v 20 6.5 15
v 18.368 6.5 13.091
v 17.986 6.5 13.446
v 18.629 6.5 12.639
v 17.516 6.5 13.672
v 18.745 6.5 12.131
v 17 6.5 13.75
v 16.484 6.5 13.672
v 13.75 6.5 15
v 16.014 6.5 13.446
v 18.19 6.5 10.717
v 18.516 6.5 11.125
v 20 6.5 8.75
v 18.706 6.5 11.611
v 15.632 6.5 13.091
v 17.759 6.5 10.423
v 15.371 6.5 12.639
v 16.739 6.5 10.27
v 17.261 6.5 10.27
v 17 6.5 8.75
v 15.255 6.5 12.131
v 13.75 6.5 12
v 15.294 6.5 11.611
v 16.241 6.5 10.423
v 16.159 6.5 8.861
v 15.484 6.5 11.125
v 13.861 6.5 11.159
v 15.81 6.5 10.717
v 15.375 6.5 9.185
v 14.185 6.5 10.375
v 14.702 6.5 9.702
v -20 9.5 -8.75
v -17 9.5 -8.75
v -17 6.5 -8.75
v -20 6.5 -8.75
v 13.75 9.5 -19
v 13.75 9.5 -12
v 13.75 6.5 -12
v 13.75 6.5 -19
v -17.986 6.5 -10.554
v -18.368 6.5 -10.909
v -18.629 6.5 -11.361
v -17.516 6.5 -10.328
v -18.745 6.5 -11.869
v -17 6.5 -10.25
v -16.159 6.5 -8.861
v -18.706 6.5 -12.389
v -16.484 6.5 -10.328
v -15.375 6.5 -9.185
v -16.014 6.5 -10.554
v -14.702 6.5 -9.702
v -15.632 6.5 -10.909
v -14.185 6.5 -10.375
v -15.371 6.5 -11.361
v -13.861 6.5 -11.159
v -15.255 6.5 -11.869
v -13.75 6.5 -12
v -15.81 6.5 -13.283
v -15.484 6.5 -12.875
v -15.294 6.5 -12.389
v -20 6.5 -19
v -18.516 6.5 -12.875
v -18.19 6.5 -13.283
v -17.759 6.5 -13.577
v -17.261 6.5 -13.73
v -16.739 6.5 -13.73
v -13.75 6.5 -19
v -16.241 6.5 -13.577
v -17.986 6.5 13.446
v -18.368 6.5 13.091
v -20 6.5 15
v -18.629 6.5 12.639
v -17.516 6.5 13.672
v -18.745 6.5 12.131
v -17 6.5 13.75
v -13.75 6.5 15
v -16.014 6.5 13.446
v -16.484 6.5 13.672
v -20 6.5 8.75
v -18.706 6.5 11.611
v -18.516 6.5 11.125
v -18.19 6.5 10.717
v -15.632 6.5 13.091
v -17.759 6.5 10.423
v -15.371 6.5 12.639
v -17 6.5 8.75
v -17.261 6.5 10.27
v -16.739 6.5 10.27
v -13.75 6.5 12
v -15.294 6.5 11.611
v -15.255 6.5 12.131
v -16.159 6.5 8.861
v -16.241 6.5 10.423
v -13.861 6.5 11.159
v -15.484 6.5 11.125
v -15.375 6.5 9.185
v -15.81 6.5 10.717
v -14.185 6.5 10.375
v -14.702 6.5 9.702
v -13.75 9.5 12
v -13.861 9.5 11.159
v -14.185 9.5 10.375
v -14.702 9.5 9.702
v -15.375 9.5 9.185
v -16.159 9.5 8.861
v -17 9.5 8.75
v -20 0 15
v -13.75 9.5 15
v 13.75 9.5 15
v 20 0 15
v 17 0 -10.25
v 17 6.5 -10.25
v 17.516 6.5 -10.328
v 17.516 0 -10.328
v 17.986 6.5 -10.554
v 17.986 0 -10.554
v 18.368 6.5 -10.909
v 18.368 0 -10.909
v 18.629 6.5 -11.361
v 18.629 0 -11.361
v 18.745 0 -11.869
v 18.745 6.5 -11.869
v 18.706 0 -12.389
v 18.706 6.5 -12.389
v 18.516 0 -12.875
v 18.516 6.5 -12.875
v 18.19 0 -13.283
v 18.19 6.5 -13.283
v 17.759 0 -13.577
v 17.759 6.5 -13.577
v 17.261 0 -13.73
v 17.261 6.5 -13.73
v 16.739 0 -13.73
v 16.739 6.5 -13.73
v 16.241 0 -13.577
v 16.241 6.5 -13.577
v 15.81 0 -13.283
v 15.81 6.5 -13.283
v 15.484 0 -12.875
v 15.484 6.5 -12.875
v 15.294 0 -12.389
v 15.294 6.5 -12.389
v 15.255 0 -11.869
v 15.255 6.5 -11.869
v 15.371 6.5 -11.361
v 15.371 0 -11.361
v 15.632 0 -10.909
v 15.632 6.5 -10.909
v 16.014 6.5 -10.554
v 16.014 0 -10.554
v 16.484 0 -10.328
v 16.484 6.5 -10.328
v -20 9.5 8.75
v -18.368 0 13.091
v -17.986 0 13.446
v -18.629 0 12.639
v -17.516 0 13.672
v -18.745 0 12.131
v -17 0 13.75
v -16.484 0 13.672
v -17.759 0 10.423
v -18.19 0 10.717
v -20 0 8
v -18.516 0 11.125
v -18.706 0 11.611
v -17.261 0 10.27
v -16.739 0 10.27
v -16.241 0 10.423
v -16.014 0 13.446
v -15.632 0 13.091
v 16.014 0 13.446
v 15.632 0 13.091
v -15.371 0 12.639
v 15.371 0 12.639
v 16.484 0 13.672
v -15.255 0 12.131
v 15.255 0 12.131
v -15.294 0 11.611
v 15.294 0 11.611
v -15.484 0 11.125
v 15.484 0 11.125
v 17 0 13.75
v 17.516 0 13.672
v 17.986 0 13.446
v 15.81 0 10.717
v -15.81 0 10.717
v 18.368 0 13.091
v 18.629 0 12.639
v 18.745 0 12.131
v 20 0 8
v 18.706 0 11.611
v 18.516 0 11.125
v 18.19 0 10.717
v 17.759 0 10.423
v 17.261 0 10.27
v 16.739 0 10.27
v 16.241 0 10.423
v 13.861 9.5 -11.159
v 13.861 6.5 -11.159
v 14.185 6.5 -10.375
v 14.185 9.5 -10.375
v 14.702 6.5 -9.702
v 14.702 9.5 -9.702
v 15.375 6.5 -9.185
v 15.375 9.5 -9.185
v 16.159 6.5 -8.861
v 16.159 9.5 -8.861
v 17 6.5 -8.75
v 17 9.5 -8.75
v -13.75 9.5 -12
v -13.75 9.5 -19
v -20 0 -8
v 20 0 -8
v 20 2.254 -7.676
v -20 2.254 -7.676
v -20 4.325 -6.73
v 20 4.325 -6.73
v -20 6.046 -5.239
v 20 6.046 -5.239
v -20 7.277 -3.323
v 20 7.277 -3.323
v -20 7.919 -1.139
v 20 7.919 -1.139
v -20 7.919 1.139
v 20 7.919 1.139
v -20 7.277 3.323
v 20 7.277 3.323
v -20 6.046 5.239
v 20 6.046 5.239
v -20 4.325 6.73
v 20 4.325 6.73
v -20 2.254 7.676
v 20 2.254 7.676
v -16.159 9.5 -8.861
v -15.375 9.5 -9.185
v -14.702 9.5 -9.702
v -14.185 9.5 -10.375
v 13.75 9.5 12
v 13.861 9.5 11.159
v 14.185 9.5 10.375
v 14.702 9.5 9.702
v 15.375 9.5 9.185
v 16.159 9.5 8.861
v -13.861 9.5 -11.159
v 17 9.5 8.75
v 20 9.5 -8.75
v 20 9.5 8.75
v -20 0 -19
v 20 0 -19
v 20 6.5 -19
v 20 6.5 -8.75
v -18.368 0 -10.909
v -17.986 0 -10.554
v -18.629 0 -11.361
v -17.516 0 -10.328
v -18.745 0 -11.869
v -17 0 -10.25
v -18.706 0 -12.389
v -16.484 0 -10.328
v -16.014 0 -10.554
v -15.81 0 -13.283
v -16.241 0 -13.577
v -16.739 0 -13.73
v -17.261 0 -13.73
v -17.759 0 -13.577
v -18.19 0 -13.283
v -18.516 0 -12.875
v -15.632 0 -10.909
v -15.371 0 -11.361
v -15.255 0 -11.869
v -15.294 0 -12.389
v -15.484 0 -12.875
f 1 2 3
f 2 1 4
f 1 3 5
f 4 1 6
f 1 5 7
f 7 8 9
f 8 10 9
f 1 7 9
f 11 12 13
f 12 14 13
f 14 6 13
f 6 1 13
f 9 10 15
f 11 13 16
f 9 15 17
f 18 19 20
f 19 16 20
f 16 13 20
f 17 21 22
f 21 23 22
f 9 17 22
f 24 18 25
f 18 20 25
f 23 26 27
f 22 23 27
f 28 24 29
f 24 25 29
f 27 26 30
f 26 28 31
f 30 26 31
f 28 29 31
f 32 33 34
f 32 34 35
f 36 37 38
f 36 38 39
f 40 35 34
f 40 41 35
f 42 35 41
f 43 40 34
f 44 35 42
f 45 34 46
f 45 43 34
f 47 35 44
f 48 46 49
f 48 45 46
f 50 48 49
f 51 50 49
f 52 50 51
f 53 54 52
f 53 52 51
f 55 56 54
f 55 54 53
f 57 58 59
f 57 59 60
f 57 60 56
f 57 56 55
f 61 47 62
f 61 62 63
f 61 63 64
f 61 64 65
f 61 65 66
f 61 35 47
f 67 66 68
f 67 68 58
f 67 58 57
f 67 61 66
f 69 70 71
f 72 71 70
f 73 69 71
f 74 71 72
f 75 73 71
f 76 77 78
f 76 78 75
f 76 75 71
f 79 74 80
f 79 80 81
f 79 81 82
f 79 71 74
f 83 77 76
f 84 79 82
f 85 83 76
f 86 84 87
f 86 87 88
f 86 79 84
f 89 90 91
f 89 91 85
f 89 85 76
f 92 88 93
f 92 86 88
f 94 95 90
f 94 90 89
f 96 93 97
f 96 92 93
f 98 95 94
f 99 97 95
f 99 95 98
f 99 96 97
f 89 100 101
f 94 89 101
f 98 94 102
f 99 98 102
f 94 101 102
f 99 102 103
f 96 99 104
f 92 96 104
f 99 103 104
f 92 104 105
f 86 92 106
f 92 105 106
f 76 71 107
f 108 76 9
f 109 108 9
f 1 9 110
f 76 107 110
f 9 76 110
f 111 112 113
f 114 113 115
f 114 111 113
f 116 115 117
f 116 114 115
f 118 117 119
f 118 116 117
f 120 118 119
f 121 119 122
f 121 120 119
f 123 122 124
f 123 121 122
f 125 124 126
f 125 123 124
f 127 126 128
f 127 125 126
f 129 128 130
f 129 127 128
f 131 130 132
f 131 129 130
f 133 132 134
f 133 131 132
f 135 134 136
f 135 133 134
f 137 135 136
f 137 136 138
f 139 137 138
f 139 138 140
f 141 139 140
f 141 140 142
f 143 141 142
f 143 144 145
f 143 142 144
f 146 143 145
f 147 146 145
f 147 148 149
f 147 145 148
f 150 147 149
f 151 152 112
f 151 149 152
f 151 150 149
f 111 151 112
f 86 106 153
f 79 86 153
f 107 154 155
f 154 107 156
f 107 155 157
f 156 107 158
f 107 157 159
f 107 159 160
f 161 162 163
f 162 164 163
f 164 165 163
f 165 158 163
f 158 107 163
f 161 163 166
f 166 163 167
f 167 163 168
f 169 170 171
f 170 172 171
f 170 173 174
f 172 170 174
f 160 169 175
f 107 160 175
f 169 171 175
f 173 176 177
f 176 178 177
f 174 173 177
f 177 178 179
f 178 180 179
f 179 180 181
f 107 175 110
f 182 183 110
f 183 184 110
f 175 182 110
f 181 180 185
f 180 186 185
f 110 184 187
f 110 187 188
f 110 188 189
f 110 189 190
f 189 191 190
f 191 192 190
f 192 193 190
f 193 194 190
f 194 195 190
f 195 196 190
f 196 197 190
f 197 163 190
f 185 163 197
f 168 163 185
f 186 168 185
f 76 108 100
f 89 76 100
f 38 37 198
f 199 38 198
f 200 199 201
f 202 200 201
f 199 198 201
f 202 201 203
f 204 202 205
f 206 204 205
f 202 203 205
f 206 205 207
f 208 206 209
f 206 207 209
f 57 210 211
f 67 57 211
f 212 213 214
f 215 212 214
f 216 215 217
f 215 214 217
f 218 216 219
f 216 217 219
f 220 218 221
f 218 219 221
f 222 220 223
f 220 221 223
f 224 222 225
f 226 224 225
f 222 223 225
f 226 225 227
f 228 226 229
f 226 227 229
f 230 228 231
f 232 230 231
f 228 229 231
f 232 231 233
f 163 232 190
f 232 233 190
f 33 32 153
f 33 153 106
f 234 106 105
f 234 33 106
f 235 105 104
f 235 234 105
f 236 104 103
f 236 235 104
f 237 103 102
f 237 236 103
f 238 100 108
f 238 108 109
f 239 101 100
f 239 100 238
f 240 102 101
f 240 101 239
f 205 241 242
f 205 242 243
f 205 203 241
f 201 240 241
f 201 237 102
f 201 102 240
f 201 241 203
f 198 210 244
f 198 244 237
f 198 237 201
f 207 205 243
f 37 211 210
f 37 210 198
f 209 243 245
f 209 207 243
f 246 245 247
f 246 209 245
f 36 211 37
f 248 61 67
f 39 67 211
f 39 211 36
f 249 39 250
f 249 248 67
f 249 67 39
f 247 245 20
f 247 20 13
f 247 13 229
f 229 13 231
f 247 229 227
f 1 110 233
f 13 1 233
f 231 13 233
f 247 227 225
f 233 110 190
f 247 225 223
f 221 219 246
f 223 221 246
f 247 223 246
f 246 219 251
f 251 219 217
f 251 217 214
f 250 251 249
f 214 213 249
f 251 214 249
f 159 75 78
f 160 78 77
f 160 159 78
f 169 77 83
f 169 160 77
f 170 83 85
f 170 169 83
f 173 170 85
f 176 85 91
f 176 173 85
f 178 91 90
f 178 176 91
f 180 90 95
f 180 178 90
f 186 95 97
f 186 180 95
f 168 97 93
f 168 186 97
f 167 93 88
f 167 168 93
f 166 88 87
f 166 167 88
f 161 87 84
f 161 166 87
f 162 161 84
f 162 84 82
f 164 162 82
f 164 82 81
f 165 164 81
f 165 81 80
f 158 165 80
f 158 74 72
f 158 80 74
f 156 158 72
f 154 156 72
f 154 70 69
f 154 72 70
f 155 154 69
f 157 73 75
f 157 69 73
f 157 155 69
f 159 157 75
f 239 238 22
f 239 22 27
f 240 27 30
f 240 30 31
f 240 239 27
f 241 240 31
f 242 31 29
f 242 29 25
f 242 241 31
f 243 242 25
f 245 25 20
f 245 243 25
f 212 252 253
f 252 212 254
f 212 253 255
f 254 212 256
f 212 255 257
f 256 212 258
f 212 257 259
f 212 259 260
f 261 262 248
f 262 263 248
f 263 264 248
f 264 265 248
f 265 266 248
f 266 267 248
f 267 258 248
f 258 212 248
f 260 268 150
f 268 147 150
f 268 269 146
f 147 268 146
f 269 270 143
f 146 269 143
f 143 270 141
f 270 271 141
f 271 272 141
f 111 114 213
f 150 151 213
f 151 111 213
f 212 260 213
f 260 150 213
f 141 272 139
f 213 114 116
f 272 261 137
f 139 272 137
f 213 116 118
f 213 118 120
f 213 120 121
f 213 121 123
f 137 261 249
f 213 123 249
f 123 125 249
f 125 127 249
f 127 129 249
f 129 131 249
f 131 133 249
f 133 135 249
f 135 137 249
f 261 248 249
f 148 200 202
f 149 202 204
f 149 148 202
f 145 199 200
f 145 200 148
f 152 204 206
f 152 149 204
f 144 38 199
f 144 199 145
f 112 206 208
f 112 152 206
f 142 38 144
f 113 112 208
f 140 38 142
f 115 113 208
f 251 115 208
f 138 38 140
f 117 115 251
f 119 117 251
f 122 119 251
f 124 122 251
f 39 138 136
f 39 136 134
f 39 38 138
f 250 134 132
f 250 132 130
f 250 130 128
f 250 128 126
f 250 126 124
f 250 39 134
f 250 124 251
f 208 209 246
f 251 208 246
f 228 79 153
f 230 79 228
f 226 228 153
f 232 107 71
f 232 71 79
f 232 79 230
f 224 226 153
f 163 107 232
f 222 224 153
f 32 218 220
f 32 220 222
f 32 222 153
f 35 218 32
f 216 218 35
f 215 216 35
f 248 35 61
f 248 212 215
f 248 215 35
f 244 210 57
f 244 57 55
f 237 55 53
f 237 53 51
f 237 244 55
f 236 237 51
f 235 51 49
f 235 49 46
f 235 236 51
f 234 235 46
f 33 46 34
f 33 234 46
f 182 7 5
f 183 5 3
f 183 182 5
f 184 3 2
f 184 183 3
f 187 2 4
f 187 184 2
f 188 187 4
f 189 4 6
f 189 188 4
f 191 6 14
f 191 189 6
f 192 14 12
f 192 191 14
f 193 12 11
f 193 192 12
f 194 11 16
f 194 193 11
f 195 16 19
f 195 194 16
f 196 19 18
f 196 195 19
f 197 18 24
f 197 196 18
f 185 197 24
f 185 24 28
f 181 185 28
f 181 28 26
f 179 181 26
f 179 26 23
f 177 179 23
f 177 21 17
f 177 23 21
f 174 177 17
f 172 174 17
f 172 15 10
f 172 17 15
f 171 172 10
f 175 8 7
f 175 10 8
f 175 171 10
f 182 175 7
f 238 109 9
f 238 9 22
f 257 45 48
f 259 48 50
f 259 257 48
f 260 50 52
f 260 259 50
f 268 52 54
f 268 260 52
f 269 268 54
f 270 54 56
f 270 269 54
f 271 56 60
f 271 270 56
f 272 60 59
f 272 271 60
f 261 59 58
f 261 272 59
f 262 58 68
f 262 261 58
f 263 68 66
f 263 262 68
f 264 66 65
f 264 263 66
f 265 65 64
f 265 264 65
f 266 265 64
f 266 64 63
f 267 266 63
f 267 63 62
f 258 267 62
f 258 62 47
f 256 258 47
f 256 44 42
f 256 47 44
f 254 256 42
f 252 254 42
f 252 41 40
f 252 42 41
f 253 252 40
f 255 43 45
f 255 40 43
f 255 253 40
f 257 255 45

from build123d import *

# Parameters (mm, degrees)
SKETCH1_W            = 40
SKETCH1_H            = 34
SKETCH1_R            = 1.75
BOSS_EXTRUDE1_DEPTH  = 9.5
SKETCH2_R            = 8
CUT_EXTRUDE1_DEPTH   = 46.290727528
CUT_EXTRUDE2_DEPTH   = 3
MIRROR2_COPY_1_DEPTH = 3
SKETCH4_W            = 6.25
SKETCH4_H            = 4
CUT_EXTRUDE3_DEPTH   = 3


with BuildPart() as part:
    # Sketch1 → Boss-Extrude1 (new body)
    with BuildSketch(Plane(origin=(0, 0, 0), x_dir=(1, 0, 0), z_dir=(0, 1, 0))):
        with Locations((0, 2)):
            Rectangle(SKETCH1_W, SKETCH1_H)
        with Locations(Location((-17, 12, 0), (0, 0, 270))):
            Circle(SKETCH1_R, mode=Mode.SUBTRACT)
        with Locations(Location((17, 12, 0), (0, 0, 270))):
            Circle(SKETCH1_R, mode=Mode.SUBTRACT)
        with Locations(Location((17, -12, 0), (0, 0, 270))):
            Circle(SKETCH1_R, mode=Mode.SUBTRACT)
        with Locations(Location((-17, -12, 0), (0, 0, 270))):
            Circle(SKETCH1_R, mode=Mode.SUBTRACT)
    extrude(amount=BOSS_EXTRUDE1_DEPTH)

    # Sketch2 → Cut-Extrude1 (cut, through all)
    with BuildSketch(Plane(origin=(20, 0, 0), x_dir=(0, 0, -1), z_dir=(1, 0, 0))):
        Circle(SKETCH2_R)
    extrude(amount=-CUT_EXTRUDE1_DEPTH, mode=Mode.SUBTRACT)

    # Sketch3 → Cut-Extrude2 (cut)
    with BuildSketch(Plane(origin=(0, 9.5, 0), x_dir=(1, 0, 0), z_dir=(0, 1, 0))):
        with BuildLine():
            Line((-17, -8.75), (-20, -8.75))
            Line((-20, -8.75), (-20, -15))
            Line((-20, -15), (-13.75, -15))
            Line((-13.75, -15), (-13.75, -12))
            ThreePointArc((-13.75, -12), (-14.701902961, -9.701902961), (-17, -8.75))
        make_face()
    cut_extrude2 = extrude(amount=-CUT_EXTRUDE2_DEPTH, mode=Mode.SUBTRACT)

    # Mirror1: Cut-Extrude2 across plane
    add(cut_extrude2.mirror(Plane(origin=(0, 0, 0), x_dir=(0, 0, 1), z_dir=(1, 0, 0))), mode=Mode.SUBTRACT)

    # Mirror2: Cut-Extrude2 across plane
    add(cut_extrude2.mirror(Plane.XY), mode=Mode.SUBTRACT)

    # Mirror2 copy 1 sketch → Mirror2 copy 1 (cut)
    with BuildSketch(Plane(origin=(0, 9.5, 0), x_dir=(-1, 0, 0), z_dir=(0, 1, 0))):
        with BuildLine():
            Line((-17, -8.75), (-20, -8.75))
            Line((-20, -8.75), (-20, -15))
            Line((-20, -15), (-13.75, -15))
            Line((-13.75, -15), (-13.75, -12))
            ThreePointArc((-13.75, -12), (-14.701902961, -9.701902961), (-17, -8.75))
        make_face()
    extrude(amount=-MIRROR2_COPY_1_DEPTH, mode=Mode.SUBTRACT)

    # Sketch4 → Cut-Extrude3 (cut)
    with BuildSketch(Plane(origin=(0, 9.5, 0), x_dir=(1, 0, 0), z_dir=(0, 1, 0))):
        with Locations((-16.875, 17)):
            Rectangle(SKETCH4_W, SKETCH4_H)
        with Locations((16.875, 17)):
            Rectangle(SKETCH4_W, SKETCH4_H)
    extrude(amount=-CUT_EXTRUDE3_DEPTH, mode=Mode.SUBTRACT)


solid = part.part
